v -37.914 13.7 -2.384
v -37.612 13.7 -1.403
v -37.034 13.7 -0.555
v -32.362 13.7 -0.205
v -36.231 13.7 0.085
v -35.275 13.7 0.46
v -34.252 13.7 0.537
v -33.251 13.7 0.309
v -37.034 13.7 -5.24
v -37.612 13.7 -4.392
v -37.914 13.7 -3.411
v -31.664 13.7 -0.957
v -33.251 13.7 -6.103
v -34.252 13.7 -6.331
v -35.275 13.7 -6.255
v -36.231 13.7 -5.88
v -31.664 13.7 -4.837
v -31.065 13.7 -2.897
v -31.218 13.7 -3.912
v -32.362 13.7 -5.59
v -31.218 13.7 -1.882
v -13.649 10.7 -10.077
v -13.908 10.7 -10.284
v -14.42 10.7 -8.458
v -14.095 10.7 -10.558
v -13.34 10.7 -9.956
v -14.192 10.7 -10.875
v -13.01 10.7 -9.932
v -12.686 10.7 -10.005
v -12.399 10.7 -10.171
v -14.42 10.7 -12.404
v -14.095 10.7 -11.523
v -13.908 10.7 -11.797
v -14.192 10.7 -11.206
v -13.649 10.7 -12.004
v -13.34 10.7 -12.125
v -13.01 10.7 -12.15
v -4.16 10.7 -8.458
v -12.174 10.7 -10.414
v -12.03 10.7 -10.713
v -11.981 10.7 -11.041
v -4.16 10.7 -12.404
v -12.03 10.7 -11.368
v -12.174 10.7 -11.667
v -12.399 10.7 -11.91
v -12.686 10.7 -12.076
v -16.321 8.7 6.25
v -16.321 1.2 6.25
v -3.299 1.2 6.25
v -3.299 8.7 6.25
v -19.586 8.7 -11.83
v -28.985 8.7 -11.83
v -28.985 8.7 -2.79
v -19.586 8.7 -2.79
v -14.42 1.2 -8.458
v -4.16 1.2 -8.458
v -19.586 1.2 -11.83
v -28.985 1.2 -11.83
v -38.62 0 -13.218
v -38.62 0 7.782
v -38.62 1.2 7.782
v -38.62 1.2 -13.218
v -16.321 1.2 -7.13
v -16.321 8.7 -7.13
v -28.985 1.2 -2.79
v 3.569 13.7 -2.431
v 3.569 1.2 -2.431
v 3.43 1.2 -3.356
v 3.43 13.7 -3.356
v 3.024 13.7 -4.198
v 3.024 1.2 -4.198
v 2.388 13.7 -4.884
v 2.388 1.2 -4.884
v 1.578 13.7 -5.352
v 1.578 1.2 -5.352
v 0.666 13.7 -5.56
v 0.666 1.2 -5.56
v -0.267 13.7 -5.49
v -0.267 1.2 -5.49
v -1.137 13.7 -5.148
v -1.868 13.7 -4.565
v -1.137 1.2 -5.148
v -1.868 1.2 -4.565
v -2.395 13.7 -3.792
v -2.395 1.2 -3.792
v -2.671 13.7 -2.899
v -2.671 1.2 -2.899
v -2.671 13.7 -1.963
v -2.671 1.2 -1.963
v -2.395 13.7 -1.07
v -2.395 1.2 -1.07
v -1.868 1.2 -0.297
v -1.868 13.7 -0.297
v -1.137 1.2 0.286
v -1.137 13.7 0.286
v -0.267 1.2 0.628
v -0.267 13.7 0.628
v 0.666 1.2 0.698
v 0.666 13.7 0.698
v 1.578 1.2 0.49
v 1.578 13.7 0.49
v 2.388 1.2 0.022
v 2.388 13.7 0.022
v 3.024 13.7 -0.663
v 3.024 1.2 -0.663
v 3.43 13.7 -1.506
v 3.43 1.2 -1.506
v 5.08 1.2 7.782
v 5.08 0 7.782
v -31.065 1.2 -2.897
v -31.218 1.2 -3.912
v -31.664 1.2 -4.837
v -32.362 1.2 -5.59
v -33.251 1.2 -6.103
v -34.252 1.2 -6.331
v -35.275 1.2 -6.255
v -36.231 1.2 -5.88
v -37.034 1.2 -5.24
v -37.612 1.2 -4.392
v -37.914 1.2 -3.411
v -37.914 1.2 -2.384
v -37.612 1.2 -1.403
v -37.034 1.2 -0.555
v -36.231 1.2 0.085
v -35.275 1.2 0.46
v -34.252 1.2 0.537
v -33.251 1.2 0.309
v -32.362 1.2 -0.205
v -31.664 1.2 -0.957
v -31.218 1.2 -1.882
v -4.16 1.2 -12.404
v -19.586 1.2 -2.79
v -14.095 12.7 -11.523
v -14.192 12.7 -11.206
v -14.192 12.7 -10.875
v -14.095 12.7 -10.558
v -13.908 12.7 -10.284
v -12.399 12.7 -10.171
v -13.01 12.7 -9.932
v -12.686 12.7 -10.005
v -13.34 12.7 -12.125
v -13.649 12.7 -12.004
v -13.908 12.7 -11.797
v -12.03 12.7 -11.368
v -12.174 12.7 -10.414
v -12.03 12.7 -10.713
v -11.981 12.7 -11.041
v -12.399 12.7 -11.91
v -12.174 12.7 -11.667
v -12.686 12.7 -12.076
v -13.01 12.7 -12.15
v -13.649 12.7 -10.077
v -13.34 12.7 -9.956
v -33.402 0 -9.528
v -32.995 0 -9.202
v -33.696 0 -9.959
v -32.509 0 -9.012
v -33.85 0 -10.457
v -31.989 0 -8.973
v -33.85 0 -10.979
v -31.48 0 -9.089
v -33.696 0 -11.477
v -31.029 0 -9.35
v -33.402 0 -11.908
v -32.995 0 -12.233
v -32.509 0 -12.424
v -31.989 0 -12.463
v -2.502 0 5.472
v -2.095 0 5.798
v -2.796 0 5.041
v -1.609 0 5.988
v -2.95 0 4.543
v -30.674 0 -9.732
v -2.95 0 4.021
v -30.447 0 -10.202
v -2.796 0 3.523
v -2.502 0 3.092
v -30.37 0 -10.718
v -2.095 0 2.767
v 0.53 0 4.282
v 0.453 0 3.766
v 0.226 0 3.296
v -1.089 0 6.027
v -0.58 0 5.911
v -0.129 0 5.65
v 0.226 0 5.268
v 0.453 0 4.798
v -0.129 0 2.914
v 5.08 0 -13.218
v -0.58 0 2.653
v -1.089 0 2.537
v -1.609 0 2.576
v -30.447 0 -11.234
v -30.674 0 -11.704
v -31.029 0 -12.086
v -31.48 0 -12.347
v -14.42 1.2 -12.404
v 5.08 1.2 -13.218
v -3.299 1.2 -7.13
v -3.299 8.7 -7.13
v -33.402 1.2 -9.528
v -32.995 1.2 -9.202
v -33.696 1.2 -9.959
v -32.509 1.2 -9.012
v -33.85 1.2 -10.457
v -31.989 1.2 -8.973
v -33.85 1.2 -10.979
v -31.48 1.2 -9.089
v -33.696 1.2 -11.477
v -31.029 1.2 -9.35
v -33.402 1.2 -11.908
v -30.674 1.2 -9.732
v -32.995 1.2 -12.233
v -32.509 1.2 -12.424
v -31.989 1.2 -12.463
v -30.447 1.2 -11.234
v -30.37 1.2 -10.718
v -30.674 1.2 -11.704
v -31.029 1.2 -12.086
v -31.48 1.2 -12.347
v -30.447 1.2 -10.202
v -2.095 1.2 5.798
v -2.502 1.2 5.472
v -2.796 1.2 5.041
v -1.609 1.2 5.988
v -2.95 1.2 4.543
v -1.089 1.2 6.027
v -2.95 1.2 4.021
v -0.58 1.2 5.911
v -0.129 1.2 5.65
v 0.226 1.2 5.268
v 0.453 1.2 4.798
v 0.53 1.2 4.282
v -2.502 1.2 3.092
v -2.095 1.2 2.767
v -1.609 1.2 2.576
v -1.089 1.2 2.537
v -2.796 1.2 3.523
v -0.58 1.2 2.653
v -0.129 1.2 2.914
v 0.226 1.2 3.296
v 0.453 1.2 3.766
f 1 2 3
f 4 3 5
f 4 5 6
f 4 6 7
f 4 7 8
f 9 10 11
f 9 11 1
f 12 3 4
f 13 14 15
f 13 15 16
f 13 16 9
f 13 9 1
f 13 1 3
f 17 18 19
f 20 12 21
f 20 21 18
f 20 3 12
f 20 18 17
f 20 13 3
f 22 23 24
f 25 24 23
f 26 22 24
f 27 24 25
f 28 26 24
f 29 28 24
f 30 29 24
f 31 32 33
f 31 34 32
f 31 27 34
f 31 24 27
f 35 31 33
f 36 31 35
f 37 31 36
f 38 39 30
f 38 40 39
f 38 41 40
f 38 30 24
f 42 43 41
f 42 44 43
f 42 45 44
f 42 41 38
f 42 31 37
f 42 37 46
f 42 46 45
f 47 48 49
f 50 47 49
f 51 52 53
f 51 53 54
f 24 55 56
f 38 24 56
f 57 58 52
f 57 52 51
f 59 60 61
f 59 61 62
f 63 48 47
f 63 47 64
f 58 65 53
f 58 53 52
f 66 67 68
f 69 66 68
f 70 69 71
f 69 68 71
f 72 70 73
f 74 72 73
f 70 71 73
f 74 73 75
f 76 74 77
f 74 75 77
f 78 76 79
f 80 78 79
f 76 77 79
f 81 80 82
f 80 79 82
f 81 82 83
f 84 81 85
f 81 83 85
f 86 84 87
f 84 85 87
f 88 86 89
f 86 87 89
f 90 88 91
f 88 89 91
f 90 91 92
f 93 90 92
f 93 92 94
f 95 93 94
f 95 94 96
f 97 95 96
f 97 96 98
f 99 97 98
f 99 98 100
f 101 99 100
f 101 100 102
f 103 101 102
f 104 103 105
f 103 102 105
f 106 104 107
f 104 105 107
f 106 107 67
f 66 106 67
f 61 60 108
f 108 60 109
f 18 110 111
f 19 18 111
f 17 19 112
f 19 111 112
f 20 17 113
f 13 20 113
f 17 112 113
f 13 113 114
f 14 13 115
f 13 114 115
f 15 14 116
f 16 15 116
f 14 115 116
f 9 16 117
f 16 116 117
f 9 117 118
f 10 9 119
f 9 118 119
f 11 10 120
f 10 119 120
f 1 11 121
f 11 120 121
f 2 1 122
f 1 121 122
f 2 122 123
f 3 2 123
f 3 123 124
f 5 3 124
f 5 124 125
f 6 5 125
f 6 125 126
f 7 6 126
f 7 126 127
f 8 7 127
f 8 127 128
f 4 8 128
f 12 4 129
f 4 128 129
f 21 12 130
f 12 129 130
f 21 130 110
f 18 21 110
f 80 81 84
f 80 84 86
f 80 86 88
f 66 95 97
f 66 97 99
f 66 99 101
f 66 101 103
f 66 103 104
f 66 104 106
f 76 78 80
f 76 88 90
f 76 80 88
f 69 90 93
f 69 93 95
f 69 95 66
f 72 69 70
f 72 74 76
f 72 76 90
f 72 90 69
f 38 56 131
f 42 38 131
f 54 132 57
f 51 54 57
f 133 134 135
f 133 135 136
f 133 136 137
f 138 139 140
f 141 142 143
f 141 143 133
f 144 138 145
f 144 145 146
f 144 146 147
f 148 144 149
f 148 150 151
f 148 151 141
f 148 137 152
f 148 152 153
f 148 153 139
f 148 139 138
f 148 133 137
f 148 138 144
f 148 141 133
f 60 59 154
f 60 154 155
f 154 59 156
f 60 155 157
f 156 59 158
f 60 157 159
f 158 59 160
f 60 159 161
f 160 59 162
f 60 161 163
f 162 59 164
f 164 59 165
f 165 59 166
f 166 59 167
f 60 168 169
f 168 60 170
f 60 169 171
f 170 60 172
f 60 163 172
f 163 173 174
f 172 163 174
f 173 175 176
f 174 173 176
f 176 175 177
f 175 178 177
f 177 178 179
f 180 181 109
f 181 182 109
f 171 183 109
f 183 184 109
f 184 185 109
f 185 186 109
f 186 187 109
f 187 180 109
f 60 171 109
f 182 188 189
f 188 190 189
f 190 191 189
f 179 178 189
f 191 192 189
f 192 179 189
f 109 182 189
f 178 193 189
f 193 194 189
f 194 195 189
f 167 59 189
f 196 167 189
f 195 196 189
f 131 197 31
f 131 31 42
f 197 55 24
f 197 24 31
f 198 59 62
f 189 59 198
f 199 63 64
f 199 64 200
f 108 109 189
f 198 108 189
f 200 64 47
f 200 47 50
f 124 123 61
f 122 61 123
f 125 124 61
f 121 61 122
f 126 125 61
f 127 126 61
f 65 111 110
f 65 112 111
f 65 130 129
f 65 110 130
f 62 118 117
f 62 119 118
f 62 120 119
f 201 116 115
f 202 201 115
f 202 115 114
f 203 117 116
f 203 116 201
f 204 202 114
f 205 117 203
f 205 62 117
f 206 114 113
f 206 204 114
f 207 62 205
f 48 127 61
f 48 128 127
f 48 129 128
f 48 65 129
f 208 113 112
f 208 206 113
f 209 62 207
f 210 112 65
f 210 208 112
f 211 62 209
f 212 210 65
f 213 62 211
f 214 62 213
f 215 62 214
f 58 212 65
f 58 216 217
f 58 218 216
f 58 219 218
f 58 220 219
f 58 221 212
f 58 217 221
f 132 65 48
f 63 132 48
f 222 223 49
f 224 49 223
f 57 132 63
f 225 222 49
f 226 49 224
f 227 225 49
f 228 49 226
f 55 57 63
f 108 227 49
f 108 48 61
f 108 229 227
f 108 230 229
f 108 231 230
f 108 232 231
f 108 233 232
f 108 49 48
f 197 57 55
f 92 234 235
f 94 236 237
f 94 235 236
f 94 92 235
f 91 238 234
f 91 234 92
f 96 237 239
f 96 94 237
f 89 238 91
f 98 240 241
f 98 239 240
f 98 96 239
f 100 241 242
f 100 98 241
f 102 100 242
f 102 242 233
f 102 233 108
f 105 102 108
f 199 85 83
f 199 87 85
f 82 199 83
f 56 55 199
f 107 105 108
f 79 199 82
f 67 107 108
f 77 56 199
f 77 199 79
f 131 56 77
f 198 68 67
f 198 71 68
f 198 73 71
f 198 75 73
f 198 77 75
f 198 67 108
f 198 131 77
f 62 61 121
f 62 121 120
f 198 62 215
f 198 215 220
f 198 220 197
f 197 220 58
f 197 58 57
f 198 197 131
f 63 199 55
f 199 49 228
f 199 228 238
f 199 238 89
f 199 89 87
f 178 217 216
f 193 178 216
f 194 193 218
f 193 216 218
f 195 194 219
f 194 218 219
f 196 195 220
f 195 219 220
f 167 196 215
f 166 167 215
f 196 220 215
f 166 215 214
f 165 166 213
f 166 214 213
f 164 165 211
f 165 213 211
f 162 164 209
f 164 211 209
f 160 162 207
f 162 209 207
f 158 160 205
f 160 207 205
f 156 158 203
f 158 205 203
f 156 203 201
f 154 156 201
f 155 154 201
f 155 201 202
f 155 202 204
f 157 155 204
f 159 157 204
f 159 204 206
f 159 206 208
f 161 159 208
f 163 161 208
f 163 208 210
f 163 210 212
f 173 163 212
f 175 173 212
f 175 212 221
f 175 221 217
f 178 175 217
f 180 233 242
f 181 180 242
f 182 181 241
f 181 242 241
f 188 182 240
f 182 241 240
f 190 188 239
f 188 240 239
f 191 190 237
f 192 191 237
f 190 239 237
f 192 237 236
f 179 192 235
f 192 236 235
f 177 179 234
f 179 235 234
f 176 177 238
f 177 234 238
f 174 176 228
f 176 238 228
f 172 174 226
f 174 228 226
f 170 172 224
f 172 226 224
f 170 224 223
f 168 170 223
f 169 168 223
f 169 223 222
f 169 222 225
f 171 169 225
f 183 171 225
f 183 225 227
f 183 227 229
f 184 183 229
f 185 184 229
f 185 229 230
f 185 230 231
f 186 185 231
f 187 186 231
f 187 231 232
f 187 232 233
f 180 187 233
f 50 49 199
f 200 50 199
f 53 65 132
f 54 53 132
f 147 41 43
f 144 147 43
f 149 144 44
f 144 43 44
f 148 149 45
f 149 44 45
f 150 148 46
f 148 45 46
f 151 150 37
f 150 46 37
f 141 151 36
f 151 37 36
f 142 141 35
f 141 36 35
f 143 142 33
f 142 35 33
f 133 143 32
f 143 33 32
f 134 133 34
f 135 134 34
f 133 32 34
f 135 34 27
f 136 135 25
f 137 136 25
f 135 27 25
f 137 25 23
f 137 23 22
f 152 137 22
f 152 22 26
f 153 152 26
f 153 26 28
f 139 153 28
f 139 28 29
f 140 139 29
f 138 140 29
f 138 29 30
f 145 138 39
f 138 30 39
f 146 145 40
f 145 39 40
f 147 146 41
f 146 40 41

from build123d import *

# Parameters (mm, degrees)
SKETCH1_W           = 43.7
SKETCH1_H           = 21
BOSS_EXTRUDE1_DEPTH = 1.2
SKETCH2_R           = 3.443854009
SKETCH2_R_2         = 3.137647978
BOSS_EXTRUDE2_DEPTH = 12.5
SKETCH3_W           = 13.022072972
SKETCH3_H           = 13.380807765
SKETCH3_W_2         = 9.398851567
SKETCH3_H_2         = 9.040116774
BOSS_EXTRUDE4_DEPTH = 7.5
SKETCH4_W           = 10.259815069
SKETCH4_H           = 3.946082718
BOSS_EXTRUDE5_DEPTH = 9.5
SKETCH5_R           = 1.112077857
BOSS_EXTRUDE6_DEPTH = 2
SKETCH6_R           = 1.75
CUT_EXTRUDE1_DEPTH  = 2


with BuildPart() as part:
    # Sketch1 → Boss-Extrude1 (new body)
    with BuildSketch(Plane(origin=(0, 0, 0), x_dir=(1, 0, 0), z_dir=(0, 1, 0))):
        with Locations((-16.769650206, 2.717901235)):
            Rectangle(SKETCH1_W, SKETCH1_H)
    extrude(amount=BOSS_EXTRUDE1_DEPTH)

    # Sketch2 → Boss-Extrude2 (add)
    with BuildSketch(Plane(origin=(0, 1.2, 0), x_dir=(1, 0, 0), z_dir=(0, 1, 0))):
        with Locations((-34.509085701, 2.897268631)):
            Circle(SKETCH2_R)
        with Locations((0.4316831, 2.4309134)):
            Circle(SKETCH2_R_2)
    extrude(amount=BOSS_EXTRUDE2_DEPTH)

    # Sketch3 → Boss-Extrude4 (add)
    with BuildSketch(Plane(origin=(0, 1.2, 0), x_dir=(1, 0, 0), z_dir=(0, 1, 0))):
        with Locations((-9.810195229, 0.439935301)):
            Rectangle(SKETCH3_W, SKETCH3_H)
        with Locations((-24.285144112, 7.30970658)):
            Rectangle(SKETCH3_W_2, SKETCH3_H_2)
    extrude(amount=BOSS_EXTRUDE4_DEPTH)

    # Sketch4 → Boss-Extrude5 (add)
    with BuildSketch(Plane(origin=(0, 1.2, 0), x_dir=(1, 0, 0), z_dir=(0, 1, 0))):
        with Locations((-9.290029779, 10.430699276)):
            Rectangle(SKETCH4_W, SKETCH4_H)
    extrude(amount=BOSS_EXTRUDE5_DEPTH)

    # Sketch5 → Boss-Extrude6 (add)
    with BuildSketch(Plane(origin=(0, 10.7, 0), x_dir=(1, 0, 0), z_dir=(0, 1, 0))):
        with Locations((-13.092618581, 11.040548423)):
            Circle(SKETCH5_R)
    extrude(amount=BOSS_EXTRUDE6_DEPTH)

    # Sketch6 → Cut-Extrude1 (cut)
    with BuildSketch(Plane(origin=(0, 1.2, 0), x_dir=(1, 0, 0), z_dir=(0, 1, 0))):
        with Locations((-32.119650206, 10.717901235)):
            Circle(SKETCH6_R)
        with Locations((-1.219650206, -4.282098765)):
            Circle(SKETCH6_R)
    extrude(amount=-CUT_EXTRUDE1_DEPTH, mode=Mode.SUBTRACT)


solid = part.part
